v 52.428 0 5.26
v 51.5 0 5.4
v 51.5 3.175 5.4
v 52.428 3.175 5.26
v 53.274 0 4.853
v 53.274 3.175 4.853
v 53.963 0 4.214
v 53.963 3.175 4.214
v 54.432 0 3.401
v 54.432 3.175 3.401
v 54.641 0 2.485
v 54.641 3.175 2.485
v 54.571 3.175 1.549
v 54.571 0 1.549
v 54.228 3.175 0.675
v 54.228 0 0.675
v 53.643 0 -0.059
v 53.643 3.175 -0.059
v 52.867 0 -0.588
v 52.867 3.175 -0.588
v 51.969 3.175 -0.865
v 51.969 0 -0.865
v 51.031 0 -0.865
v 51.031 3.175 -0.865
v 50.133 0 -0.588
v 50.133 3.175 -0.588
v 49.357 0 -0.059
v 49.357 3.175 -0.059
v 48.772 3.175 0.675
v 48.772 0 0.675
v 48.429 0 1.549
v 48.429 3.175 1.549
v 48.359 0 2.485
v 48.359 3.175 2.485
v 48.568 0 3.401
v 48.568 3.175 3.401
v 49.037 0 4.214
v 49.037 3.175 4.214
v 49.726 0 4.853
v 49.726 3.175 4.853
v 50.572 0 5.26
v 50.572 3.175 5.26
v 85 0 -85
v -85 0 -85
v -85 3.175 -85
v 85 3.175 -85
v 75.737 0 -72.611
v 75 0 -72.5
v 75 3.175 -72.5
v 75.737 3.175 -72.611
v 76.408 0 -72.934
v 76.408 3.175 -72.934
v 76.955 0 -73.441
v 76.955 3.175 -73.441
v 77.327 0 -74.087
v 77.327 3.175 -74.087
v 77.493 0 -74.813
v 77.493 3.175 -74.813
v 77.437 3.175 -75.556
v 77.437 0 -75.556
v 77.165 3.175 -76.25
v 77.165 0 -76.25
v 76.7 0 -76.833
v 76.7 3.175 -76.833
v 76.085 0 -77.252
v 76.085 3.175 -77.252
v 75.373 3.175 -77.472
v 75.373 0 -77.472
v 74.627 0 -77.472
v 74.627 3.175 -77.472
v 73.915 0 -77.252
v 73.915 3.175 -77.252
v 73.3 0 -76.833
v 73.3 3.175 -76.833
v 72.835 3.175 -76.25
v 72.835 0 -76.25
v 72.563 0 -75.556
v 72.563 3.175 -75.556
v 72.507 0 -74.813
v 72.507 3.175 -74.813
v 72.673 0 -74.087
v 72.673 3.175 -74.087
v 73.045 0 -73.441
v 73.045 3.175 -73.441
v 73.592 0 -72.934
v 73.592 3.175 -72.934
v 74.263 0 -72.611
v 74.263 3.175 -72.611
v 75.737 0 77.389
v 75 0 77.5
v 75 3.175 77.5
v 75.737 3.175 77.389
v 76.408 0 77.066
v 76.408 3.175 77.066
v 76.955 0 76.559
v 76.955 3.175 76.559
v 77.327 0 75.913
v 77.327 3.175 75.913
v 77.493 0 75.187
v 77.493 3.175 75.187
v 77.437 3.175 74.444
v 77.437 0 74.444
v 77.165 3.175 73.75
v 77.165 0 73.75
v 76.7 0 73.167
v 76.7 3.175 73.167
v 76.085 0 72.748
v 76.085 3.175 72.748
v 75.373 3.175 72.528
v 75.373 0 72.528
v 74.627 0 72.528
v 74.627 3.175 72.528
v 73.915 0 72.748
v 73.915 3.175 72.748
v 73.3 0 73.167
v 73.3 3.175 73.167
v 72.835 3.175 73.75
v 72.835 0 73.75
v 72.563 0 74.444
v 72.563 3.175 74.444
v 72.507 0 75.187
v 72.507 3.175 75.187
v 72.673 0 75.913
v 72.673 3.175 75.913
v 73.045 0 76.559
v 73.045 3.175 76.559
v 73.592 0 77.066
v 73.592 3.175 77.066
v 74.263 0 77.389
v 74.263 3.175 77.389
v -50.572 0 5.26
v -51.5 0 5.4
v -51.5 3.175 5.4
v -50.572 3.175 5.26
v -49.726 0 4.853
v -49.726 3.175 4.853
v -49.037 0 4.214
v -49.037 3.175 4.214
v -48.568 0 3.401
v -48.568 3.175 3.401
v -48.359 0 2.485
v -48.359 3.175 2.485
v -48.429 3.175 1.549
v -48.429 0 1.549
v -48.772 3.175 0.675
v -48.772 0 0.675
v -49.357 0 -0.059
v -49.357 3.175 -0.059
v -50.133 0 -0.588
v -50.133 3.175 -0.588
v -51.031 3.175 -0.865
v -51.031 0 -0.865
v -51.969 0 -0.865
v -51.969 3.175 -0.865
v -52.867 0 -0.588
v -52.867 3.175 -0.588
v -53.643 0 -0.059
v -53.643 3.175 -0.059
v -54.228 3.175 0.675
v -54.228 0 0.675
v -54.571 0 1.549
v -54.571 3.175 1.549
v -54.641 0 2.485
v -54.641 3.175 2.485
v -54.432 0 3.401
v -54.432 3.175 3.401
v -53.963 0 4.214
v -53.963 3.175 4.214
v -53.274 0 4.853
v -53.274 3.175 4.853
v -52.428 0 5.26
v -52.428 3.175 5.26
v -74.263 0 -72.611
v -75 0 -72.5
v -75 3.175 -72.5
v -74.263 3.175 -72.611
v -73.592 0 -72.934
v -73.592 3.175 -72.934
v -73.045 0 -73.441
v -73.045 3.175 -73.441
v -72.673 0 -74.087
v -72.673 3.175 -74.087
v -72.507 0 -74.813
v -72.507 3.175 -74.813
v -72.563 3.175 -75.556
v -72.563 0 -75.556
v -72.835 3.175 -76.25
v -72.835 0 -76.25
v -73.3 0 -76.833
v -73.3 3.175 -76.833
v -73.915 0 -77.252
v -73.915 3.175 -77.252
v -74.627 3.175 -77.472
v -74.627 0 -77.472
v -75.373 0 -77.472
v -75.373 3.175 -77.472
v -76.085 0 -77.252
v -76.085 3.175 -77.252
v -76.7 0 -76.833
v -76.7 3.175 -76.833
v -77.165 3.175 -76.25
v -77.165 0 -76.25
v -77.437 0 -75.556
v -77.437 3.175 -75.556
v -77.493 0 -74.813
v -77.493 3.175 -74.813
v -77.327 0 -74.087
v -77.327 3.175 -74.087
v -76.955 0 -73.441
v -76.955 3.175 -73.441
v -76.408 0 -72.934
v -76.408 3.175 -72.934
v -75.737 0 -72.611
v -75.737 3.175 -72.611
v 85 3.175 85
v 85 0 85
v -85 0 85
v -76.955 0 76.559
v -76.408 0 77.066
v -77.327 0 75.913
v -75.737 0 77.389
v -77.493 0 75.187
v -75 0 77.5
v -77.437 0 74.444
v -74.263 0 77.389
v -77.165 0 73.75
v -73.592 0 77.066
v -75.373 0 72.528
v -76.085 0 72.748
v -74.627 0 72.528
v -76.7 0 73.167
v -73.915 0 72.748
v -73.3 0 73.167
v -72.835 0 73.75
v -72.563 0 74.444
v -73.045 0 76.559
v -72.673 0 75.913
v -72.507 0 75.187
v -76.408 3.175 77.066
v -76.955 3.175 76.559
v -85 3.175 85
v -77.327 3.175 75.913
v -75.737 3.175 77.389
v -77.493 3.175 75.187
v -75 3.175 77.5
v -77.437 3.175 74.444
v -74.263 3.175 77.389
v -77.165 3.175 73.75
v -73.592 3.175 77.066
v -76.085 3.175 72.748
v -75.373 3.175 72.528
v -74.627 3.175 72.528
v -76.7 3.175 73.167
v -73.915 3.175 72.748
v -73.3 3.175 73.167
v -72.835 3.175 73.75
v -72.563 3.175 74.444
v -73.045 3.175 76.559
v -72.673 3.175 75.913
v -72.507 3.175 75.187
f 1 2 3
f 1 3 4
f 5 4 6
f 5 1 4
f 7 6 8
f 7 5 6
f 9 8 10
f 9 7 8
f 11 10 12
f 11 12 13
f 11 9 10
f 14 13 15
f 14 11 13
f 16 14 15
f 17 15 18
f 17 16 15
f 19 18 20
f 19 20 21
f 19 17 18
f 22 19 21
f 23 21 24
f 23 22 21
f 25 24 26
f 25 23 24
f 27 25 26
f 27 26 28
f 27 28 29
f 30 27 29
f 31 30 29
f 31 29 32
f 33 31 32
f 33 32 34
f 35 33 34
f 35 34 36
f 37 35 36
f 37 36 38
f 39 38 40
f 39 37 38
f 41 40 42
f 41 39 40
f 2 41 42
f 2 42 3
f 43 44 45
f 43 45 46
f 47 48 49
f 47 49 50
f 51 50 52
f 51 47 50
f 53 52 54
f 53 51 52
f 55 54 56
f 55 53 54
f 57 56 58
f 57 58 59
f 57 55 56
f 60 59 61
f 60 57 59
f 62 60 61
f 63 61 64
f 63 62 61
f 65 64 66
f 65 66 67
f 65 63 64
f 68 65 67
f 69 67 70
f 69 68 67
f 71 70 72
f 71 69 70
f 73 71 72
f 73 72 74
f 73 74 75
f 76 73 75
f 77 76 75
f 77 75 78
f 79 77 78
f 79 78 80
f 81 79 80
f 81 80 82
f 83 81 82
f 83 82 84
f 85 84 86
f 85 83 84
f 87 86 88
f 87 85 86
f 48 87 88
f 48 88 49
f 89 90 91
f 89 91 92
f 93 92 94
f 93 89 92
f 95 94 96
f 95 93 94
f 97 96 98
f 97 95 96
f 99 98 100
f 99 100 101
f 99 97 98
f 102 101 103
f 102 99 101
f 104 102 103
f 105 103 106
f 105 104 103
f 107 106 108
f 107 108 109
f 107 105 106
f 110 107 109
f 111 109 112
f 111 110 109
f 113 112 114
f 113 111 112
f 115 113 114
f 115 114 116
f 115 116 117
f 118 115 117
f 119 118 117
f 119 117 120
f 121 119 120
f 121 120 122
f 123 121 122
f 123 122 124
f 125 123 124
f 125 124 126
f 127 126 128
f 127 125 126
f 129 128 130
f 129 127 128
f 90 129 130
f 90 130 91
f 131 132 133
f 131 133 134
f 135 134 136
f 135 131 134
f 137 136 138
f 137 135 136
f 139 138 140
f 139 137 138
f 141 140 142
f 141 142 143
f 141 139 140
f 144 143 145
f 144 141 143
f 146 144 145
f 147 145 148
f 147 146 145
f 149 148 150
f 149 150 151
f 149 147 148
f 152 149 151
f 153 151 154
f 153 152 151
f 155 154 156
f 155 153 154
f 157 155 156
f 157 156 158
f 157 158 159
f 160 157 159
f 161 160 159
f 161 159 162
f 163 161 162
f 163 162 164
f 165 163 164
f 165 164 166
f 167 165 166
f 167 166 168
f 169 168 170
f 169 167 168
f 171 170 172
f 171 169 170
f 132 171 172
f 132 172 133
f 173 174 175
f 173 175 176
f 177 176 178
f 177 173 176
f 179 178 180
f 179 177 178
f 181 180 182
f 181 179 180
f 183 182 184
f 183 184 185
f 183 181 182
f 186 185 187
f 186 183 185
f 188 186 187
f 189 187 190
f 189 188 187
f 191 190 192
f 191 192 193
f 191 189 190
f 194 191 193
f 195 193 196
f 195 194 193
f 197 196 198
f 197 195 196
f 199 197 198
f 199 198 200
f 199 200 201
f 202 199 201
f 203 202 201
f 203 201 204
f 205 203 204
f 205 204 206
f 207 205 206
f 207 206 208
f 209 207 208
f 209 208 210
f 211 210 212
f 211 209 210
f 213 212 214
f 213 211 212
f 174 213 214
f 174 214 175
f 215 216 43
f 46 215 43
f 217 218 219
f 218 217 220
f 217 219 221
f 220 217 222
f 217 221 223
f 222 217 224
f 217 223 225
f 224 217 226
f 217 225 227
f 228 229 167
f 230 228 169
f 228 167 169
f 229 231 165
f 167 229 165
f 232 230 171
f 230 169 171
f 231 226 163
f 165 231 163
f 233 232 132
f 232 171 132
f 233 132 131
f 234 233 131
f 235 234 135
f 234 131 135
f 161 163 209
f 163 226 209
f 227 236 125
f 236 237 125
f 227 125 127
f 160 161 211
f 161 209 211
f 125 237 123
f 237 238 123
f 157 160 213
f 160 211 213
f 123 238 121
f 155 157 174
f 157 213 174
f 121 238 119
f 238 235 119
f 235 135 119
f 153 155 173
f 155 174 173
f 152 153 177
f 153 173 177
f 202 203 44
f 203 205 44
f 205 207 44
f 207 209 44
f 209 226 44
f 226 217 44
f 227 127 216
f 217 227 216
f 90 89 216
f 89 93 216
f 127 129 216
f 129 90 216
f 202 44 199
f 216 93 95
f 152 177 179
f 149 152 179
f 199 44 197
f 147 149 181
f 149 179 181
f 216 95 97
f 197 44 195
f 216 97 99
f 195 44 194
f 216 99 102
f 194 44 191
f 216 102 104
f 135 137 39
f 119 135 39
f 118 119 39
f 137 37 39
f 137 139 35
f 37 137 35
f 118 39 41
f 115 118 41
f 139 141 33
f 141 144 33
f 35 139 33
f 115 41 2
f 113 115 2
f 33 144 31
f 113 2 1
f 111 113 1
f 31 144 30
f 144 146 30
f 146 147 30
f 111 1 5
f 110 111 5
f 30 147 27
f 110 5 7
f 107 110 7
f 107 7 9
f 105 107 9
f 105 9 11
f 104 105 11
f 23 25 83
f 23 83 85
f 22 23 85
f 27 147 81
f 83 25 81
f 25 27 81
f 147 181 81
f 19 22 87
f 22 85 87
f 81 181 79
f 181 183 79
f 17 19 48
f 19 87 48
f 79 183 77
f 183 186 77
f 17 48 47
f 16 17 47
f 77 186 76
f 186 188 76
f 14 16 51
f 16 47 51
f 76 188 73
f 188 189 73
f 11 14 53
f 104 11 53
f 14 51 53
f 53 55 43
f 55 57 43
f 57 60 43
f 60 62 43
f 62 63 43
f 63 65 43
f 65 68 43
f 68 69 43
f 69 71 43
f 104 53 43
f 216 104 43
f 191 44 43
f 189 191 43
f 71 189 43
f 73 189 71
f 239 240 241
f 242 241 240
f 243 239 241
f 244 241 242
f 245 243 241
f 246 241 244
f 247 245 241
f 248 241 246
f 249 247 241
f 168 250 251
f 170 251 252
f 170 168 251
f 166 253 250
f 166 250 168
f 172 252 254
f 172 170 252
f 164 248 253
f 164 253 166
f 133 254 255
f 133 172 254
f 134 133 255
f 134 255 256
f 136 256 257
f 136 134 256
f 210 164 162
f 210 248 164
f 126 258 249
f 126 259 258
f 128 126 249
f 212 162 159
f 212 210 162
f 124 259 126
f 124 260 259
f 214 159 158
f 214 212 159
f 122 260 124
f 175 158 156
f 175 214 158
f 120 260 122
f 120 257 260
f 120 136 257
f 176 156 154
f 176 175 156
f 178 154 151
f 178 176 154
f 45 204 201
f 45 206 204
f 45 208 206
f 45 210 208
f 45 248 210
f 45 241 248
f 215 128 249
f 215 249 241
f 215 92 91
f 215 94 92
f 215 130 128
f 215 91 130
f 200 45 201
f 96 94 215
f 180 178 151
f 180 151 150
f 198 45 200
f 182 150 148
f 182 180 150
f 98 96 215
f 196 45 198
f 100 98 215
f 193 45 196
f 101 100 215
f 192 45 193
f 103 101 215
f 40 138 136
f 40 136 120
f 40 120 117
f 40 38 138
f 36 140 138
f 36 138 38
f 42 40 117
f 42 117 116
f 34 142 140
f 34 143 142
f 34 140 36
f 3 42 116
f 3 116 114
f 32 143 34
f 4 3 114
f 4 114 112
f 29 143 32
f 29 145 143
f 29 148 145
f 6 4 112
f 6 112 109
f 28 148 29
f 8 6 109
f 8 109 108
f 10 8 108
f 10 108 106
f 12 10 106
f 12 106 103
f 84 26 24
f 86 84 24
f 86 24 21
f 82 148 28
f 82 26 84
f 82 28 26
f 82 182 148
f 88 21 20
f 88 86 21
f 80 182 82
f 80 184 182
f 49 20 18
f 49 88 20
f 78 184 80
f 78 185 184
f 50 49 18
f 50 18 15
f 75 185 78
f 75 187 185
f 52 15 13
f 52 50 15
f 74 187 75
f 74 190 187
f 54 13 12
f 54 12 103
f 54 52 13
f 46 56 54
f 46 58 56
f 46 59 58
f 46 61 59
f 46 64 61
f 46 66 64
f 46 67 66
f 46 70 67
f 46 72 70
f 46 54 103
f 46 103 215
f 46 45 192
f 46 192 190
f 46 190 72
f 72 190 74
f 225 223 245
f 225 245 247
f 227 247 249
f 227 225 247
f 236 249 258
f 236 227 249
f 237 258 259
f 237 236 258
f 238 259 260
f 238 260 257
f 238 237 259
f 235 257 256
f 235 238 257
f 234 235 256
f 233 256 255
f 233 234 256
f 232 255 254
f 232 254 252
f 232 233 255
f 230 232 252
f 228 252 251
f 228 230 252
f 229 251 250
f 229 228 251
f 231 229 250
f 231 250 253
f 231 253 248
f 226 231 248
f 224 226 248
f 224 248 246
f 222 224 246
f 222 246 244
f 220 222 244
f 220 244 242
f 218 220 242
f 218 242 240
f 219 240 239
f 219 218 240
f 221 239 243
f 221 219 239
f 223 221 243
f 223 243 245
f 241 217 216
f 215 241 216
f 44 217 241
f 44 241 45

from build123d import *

# Parameters (mm, degrees)
SKETCH1_W           = 170
SKETCH1_H           = 170
SKETCH1_R           = 2.5
SKETCH1_W_2         = 117
SKETCH1_H_2         = 122.5
SKETCH1_R_2         = 3.15
BOSS_EXTRUDE1_DEPTH = 3.175


with BuildPart() as part:
    # Sketch1 → Boss-Extrude1 (new body)
    # profile 1 of 2: a face of its own
    with BuildSketch(Plane(origin=(0, 0, 0), x_dir=(1, 0, 0), z_dir=(0, 1, 0))):
        Rectangle(SKETCH1_W, SKETCH1_H)
        with Locations(Location((75, -75, 0), (0, 0, 270))):
            Circle(SKETCH1_R, mode=Mode.SUBTRACT)
        with Locations(Location((75, 75, 0), (0, 0, 270))):
            Circle(SKETCH1_R, mode=Mode.SUBTRACT)
        with Locations(Location((-75, 75, 0), (0, 0, 270))):
            Circle(SKETCH1_R, mode=Mode.SUBTRACT)
        with Locations(Location((-75, -75, 0), (0, 0, 270))):
            Circle(SKETCH1_R, mode=Mode.SUBTRACT)
        Rectangle(SKETCH1_W_2, SKETCH1_H_2, mode=Mode.SUBTRACT)
    # profile 2 of 2: a face of its own
    with BuildSketch(Plane(origin=(0, 0, 0), x_dir=(1, 0, 0), z_dir=(0, 1, 0))):
        Rectangle(SKETCH1_W_2, SKETCH1_H_2)
        with Locations(Location((51.5, -2.25, 0), (0, 0, 270))):
            Circle(SKETCH1_R_2, mode=Mode.SUBTRACT)
        with Locations(Location((-51.5, -2.25, 0), (0, 0, 270))):
            Circle(SKETCH1_R_2, mode=Mode.SUBTRACT)
    extrude(amount=BOSS_EXTRUDE1_DEPTH)


solid = part.part
